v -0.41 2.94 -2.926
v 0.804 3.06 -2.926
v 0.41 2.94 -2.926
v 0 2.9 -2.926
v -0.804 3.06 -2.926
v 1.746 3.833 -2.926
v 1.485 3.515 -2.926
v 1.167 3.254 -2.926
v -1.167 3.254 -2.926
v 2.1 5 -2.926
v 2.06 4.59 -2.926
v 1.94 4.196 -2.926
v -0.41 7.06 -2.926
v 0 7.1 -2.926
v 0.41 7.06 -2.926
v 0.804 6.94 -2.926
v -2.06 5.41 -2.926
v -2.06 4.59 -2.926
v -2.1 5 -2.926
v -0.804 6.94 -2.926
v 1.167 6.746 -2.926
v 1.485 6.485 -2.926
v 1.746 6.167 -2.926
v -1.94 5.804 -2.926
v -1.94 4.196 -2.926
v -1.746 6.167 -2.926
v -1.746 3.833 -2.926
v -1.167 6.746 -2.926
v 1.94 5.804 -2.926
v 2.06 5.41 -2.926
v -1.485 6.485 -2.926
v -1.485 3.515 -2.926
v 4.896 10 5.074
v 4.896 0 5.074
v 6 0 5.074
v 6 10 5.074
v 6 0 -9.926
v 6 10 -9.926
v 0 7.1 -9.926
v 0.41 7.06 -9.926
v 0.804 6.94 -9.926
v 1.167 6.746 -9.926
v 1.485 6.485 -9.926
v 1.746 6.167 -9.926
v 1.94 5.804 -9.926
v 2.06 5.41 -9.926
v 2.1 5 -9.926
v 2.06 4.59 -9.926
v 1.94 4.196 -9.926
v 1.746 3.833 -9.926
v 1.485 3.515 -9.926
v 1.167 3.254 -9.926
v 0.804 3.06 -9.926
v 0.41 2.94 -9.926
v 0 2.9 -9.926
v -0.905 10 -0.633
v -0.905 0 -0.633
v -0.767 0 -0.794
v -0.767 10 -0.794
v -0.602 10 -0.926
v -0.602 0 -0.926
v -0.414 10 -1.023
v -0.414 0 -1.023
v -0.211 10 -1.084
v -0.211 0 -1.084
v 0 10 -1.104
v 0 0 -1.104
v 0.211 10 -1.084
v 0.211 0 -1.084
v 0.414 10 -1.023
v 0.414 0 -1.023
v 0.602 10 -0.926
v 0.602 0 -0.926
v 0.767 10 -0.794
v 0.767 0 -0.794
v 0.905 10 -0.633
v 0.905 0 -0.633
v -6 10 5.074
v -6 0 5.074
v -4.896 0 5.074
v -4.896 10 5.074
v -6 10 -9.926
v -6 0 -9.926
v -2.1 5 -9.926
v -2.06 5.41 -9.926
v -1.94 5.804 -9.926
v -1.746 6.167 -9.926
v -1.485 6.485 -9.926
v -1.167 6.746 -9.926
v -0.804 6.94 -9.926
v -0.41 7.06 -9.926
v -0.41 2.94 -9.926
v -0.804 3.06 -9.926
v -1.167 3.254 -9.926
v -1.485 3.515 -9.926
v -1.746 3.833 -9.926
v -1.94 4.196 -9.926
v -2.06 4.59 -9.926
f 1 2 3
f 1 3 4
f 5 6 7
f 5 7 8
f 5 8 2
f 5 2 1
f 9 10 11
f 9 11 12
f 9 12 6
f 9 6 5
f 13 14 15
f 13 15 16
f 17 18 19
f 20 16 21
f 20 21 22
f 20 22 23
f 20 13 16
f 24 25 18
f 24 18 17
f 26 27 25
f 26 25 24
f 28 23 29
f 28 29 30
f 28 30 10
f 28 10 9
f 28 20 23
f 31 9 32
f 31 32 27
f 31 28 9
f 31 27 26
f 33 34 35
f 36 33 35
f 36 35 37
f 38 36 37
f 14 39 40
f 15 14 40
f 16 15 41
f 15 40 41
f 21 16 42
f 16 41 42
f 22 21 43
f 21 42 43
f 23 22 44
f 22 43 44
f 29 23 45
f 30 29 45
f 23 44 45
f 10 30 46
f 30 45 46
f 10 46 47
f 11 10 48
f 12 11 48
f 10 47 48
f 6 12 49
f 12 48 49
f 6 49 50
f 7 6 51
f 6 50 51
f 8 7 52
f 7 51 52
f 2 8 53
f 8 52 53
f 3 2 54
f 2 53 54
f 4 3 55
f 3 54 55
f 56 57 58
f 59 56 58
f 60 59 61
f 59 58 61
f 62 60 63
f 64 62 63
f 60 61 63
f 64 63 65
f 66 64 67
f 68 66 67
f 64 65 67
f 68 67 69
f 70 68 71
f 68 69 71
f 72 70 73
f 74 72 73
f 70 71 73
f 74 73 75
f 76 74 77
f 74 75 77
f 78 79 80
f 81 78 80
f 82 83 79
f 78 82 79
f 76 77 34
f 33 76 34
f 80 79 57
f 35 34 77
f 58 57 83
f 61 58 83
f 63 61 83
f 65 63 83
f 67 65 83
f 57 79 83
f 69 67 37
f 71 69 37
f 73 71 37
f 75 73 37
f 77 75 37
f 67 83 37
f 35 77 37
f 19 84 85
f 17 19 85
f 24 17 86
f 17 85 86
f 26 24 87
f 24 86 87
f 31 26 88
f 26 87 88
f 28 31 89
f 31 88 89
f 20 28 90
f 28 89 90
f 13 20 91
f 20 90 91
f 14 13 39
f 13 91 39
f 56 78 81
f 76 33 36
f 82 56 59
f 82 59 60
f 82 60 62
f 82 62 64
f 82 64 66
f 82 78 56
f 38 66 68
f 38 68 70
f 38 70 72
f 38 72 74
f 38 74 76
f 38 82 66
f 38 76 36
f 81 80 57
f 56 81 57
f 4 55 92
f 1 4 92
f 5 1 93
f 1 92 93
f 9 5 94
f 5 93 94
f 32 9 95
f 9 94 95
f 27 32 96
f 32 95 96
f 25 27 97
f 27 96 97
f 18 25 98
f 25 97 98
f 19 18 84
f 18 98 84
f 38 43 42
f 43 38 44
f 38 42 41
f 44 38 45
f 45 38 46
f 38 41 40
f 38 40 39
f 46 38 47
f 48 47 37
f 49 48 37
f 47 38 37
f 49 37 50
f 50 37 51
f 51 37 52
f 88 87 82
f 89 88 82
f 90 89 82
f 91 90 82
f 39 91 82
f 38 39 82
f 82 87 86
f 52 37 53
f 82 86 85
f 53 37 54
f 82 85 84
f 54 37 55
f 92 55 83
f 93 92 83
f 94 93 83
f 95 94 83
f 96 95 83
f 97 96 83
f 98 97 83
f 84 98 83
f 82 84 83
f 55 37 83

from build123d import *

# Parameters (mm, degrees)
BOSS_EXTRUDE1_DEPTH = 10
CUT_EXTRUDE1_DEPTH  = 7


with BuildPart() as part:
    # Sketch1 → Boss-Extrude1 (new body)
    with BuildSketch(Plane(origin=(0, 0, 0), x_dir=(1, 0, 0), z_dir=(0, 1, 0))):
        with BuildLine():
            Line((0.904649293, 0.632741314), (4.896029025, -5.073854375))
            Line((4.896029025, -5.073854375), (6, -5.073854375))
            Line((6, -5.073854375), (6, 9.926145625))
            Line((6, 9.926145625), (-6, 9.926145625))
            Line((-6, 9.926145625), (-6, -5.073854375))
            Line((-6, -5.073854375), (-4.896029025, -5.073854375))
            Line((-4.896029025, -5.073854375), (-0.904649293, 0.632741314))
            ThreePointArc((-0.904649293, 0.632741314), (0, 1.103970975), (0.904649293, 0.632741314))
        make_face()
    extrude(amount=BOSS_EXTRUDE1_DEPTH)

    # Sketch2 → Cut-Extrude1 (cut)
    with BuildSketch(Plane(origin=(0, 0, -9.926145625), x_dir=(-1, 0, 0), z_dir=(0, 0, -1))):
        with BuildLine():
            ThreePointArc((0, 7.1), (-2.1, 5), (0, 2.9))
            Line((0, 2.9), (0, 7.1))
        make_face()
        with BuildLine():
            Line((0, 7.1), (0, 2.9))
            ThreePointArc((0, 2.9), (1.48492424, 3.51507576), (2.1, 5))
            ThreePointArc((2.1, 5), (1.48492424, 6.48492424), (0, 7.1))
        make_face()
    extrude(amount=-CUT_EXTRUDE1_DEPTH, mode=Mode.SUBTRACT)


solid = part.part
